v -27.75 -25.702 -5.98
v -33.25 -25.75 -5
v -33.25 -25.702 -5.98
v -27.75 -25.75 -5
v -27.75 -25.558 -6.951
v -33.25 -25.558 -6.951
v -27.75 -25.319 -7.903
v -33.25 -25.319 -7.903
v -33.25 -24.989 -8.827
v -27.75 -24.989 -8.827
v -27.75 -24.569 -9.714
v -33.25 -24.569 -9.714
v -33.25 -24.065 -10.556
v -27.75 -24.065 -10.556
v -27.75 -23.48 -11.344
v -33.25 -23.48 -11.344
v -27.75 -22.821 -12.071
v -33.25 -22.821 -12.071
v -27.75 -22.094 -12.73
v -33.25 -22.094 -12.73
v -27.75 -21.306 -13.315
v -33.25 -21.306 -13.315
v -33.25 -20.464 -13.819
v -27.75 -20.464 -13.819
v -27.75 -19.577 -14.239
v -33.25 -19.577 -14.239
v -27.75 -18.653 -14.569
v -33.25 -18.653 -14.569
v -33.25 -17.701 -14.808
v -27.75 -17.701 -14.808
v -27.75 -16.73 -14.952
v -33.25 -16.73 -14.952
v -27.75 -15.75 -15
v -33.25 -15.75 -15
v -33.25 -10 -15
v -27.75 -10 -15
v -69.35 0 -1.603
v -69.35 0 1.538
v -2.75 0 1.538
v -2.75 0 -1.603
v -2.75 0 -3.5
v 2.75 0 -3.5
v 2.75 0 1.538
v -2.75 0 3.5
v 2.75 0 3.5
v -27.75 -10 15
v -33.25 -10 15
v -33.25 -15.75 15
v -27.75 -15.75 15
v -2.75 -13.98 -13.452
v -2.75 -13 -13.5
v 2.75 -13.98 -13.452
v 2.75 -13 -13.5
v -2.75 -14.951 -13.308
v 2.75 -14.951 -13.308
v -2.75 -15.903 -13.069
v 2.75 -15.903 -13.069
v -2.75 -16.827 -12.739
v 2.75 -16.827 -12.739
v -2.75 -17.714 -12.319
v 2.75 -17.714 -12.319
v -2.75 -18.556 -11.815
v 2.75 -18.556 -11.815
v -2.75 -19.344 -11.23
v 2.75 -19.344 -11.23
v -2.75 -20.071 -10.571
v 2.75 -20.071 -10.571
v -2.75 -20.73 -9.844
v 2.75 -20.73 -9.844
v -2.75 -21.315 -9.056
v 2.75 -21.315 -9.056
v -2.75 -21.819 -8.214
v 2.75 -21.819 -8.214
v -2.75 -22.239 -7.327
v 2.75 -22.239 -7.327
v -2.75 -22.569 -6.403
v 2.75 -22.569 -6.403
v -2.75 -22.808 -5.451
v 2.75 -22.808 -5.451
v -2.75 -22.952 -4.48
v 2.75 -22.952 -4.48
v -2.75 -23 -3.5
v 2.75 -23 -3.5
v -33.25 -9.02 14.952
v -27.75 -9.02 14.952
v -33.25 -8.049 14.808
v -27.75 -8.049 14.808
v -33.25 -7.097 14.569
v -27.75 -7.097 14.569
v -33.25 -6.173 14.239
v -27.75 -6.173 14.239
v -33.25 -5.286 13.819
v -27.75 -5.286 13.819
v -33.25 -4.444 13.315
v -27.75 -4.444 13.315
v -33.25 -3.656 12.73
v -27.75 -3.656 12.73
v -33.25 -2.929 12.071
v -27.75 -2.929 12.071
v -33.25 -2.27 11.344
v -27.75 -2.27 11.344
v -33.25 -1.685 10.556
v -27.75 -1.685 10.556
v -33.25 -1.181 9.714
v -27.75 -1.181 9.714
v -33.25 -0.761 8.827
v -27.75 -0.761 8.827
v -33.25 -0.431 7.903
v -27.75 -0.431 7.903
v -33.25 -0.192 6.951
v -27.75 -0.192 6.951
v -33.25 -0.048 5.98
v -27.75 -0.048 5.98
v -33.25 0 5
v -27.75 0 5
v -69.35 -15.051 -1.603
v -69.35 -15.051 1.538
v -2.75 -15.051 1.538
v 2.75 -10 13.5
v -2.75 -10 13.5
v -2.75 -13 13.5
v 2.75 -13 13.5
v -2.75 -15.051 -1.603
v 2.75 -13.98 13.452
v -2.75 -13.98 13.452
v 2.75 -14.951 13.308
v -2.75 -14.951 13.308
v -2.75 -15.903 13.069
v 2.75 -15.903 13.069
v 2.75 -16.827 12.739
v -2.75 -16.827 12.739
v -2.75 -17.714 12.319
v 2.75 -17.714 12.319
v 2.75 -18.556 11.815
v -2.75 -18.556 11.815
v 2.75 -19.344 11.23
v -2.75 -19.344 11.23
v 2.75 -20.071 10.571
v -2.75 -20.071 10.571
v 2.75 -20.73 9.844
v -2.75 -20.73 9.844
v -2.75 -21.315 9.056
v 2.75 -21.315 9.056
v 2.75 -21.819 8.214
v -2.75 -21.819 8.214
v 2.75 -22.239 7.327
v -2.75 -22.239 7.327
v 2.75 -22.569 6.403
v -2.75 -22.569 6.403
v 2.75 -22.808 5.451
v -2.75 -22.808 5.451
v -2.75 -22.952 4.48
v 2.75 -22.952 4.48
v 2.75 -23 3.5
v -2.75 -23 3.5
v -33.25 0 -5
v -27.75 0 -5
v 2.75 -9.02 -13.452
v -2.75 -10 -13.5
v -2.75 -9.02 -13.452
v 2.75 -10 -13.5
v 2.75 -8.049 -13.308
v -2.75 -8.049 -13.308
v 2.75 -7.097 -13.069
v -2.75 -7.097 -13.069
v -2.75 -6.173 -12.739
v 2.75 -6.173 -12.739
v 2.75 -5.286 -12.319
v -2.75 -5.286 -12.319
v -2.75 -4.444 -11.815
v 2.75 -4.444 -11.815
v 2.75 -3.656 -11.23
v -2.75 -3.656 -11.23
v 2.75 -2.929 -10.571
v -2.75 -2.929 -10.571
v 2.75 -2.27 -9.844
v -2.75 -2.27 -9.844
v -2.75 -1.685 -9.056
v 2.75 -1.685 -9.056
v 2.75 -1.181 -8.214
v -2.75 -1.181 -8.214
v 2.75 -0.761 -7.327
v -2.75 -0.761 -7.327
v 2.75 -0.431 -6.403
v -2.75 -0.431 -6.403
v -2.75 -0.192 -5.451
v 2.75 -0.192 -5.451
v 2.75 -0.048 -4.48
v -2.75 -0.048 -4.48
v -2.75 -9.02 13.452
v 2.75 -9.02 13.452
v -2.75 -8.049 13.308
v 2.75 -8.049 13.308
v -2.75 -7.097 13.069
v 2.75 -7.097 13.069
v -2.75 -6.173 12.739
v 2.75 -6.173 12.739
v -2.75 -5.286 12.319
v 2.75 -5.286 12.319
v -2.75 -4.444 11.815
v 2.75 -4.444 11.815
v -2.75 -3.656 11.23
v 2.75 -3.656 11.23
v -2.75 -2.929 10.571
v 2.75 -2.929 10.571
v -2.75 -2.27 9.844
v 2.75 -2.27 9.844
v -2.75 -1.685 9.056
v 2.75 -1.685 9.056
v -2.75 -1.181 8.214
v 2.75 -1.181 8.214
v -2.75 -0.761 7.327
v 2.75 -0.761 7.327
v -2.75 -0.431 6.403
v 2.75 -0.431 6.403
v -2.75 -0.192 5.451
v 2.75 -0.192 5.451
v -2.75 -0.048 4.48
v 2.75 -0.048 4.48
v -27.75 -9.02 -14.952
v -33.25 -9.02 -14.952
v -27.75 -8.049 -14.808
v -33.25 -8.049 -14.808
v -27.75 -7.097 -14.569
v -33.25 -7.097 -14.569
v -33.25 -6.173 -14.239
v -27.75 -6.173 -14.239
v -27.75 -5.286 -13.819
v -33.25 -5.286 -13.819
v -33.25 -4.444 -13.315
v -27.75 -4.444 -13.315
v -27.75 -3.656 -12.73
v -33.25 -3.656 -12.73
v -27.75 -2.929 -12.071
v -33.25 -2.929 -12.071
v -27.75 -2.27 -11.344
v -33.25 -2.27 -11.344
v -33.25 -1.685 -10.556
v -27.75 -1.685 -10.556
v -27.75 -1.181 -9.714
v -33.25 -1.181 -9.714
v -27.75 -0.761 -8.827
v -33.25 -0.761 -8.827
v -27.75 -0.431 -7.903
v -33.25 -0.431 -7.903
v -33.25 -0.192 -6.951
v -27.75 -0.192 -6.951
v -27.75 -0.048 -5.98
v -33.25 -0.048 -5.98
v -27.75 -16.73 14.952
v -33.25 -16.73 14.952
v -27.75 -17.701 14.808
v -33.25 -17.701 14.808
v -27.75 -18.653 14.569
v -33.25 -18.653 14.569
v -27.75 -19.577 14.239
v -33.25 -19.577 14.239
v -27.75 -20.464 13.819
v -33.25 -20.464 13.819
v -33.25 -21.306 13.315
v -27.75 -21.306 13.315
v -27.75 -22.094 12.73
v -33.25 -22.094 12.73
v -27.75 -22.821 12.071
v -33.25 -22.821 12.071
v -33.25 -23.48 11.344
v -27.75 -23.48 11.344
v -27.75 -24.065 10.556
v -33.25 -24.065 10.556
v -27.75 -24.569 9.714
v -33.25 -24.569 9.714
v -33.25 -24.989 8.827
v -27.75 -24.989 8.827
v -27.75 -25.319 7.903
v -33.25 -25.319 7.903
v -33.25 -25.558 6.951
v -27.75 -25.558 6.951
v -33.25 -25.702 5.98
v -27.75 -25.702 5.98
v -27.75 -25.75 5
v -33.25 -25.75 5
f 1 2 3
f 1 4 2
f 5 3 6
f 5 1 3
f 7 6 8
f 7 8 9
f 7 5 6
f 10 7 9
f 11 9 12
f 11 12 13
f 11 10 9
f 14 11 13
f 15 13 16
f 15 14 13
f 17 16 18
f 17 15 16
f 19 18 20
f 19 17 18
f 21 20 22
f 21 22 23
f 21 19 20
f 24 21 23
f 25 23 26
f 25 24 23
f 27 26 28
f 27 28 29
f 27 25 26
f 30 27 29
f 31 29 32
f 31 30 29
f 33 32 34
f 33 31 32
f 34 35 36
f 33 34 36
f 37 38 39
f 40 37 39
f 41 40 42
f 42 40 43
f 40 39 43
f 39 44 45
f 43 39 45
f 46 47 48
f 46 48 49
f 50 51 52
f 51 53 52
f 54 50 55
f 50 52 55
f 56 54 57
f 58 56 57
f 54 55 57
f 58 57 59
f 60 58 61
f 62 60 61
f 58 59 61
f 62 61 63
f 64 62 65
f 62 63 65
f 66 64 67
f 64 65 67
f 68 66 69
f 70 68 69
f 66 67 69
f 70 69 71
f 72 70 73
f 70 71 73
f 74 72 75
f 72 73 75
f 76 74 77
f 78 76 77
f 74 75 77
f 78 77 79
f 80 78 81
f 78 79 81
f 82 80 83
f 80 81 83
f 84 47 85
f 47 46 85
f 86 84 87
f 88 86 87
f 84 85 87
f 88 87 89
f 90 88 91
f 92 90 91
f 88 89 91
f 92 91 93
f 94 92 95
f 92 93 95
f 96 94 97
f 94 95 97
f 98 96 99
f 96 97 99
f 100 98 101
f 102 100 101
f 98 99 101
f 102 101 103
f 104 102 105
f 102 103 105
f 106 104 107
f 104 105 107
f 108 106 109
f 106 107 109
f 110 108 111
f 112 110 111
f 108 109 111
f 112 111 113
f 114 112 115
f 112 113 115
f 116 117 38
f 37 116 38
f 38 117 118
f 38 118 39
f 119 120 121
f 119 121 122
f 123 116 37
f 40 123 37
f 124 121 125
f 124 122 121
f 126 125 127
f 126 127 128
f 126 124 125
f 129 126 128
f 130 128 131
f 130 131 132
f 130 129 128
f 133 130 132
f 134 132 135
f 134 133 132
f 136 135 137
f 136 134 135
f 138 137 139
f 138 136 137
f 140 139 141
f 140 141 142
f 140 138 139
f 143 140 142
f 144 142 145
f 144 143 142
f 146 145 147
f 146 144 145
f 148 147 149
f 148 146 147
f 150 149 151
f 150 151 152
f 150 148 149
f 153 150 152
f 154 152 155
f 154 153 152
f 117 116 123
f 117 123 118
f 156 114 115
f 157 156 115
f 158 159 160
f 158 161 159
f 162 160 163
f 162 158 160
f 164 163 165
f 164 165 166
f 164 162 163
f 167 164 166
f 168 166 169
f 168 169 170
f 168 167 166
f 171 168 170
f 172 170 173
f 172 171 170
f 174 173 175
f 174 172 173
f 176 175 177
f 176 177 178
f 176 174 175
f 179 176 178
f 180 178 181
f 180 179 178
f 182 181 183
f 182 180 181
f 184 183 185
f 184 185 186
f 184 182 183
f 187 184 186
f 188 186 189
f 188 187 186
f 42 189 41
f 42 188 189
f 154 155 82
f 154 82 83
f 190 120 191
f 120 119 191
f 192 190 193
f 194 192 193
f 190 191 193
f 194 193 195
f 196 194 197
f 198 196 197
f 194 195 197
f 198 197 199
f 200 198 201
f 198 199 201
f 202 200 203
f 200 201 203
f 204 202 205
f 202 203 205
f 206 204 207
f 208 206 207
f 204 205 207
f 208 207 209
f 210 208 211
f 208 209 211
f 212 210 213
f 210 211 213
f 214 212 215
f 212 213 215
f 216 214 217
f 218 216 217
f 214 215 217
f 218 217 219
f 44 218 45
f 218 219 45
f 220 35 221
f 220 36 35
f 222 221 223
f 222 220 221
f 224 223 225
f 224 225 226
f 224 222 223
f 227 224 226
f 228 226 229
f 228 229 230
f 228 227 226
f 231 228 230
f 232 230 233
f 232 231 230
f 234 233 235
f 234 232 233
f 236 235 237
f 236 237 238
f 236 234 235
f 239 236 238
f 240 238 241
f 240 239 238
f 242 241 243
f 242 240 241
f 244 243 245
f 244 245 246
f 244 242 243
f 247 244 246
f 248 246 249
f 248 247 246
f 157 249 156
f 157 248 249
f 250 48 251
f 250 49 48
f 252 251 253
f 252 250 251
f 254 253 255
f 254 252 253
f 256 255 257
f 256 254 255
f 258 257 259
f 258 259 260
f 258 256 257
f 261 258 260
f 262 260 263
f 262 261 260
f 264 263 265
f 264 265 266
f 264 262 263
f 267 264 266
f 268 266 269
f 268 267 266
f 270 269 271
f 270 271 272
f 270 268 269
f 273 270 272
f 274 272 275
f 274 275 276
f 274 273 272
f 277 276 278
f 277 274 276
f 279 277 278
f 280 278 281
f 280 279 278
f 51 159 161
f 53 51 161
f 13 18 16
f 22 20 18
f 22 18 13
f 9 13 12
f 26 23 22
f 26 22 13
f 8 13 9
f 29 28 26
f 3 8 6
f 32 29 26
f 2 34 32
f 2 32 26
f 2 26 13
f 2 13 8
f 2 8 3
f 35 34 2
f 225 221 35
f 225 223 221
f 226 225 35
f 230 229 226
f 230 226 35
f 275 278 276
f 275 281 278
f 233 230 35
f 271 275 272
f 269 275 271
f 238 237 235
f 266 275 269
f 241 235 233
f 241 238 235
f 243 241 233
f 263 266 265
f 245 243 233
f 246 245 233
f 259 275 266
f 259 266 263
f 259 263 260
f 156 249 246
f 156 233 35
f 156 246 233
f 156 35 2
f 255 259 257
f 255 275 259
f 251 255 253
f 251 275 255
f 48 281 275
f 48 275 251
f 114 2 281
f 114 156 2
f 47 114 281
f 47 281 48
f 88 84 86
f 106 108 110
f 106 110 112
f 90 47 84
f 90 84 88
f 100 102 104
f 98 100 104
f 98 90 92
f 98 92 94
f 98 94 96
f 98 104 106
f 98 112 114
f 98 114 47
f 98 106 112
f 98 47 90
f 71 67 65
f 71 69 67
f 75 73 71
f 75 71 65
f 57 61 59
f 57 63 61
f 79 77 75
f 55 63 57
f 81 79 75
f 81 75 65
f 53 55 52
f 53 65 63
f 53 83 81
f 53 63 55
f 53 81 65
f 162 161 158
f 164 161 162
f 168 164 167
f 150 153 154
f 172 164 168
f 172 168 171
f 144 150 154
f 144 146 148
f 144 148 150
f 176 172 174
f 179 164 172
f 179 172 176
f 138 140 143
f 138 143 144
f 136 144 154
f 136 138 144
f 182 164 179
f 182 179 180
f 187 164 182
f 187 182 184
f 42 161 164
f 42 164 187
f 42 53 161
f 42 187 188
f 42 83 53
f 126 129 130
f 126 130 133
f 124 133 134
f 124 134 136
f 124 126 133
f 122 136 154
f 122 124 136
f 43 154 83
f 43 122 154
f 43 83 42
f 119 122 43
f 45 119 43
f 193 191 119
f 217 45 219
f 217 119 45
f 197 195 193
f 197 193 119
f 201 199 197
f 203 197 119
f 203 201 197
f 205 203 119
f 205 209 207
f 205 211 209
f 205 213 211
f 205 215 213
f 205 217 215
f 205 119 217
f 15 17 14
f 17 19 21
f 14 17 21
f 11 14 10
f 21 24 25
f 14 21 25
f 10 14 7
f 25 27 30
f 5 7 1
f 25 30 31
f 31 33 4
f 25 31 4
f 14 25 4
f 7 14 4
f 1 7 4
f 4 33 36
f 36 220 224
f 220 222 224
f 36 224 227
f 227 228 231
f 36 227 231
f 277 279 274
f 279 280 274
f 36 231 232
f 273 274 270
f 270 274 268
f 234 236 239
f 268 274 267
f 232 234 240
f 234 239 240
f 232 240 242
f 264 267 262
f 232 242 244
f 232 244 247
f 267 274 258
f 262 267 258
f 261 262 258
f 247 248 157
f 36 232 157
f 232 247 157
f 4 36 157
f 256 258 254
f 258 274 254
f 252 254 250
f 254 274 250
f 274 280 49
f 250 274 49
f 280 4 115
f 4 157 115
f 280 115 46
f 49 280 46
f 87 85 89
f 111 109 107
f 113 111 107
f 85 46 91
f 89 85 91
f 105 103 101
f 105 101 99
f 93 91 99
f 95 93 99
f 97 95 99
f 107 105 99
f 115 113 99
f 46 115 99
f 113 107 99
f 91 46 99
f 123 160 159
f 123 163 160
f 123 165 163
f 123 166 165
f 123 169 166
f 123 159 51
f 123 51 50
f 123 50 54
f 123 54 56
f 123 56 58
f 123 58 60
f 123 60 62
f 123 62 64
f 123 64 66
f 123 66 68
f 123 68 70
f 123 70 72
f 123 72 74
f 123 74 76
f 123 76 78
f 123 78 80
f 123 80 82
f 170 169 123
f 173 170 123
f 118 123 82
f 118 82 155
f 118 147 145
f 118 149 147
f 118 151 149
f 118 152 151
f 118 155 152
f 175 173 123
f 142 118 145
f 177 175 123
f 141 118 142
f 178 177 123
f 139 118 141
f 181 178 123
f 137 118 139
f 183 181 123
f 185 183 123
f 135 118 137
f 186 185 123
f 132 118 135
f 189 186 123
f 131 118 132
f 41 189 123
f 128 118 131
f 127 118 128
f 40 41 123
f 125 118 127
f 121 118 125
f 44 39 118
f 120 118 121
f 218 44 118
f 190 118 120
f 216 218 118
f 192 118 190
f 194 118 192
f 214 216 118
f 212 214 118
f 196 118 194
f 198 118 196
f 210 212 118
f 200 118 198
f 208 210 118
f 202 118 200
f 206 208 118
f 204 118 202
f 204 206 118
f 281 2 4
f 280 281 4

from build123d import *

# Parameters (mm, degrees)
F0_W     = 5.5
F0_H     = 27
F1_DEPTH = 23
F0_H_2   = 30
F2_DEPTH = 2.75
F3_R     = 10
F4_R     = 10
F5_W     = 15.0505993515
F5_H     = 3.1405385816
F6_DEPTH = 72.1


with BuildPart() as f1:
    # F0 (on Front) → F1 (new body)
    with BuildSketch(Plane.XZ):
        Rectangle(F0_W, F0_H)
    extrude(amount=F1_DEPTH)

    # F3
    f3_edges = [f1.edges().sort_by_distance(p)[0] for p in [
        (0, -23, -13.5),
        (0, -23, 13.5),
        (0, 0, -13.5),
        (0, 0, 13.5),
    ]]
    fillet(f3_edges, radius=F3_R)

    # F5 (on face) → F6 (join)
    with BuildSketch(Plane.YZ.offset(2.75)):
        with Locations((-7.5252996758, -0.032756303)):
            Rectangle(F5_W, F5_H)
    extrude(amount=-F6_DEPTH)


with BuildPart() as f1b:
    # F0 (on Front) → F1, piece 2 (new body)
    with BuildSketch(Plane.XZ):
        with Locations((-30.5, 0)):
            Rectangle(F0_W, F0_H_2)
    extrude(amount=F1_DEPTH)

    # F2 (add, symmetric): a face of the model
    f2_faces = [f1b.faces().sort_by_distance(p)[0] for p in [
        (-30.5, -23, 0),
    ]]
    extrude(f2_faces, amount=F2_DEPTH, both=True)

    # F4
    f4_edges = [f1b.edges().sort_by_distance(p)[0] for p in [
        (-30.5, 0, 15),
        (-30.5, 0, -15),
        (-30.5, -25.75, -15),
        (-30.5, -25.75, 15),
    ]]
    fillet(f4_edges, radius=F4_R)


solid = Compound([f1.part, f1b.part])
